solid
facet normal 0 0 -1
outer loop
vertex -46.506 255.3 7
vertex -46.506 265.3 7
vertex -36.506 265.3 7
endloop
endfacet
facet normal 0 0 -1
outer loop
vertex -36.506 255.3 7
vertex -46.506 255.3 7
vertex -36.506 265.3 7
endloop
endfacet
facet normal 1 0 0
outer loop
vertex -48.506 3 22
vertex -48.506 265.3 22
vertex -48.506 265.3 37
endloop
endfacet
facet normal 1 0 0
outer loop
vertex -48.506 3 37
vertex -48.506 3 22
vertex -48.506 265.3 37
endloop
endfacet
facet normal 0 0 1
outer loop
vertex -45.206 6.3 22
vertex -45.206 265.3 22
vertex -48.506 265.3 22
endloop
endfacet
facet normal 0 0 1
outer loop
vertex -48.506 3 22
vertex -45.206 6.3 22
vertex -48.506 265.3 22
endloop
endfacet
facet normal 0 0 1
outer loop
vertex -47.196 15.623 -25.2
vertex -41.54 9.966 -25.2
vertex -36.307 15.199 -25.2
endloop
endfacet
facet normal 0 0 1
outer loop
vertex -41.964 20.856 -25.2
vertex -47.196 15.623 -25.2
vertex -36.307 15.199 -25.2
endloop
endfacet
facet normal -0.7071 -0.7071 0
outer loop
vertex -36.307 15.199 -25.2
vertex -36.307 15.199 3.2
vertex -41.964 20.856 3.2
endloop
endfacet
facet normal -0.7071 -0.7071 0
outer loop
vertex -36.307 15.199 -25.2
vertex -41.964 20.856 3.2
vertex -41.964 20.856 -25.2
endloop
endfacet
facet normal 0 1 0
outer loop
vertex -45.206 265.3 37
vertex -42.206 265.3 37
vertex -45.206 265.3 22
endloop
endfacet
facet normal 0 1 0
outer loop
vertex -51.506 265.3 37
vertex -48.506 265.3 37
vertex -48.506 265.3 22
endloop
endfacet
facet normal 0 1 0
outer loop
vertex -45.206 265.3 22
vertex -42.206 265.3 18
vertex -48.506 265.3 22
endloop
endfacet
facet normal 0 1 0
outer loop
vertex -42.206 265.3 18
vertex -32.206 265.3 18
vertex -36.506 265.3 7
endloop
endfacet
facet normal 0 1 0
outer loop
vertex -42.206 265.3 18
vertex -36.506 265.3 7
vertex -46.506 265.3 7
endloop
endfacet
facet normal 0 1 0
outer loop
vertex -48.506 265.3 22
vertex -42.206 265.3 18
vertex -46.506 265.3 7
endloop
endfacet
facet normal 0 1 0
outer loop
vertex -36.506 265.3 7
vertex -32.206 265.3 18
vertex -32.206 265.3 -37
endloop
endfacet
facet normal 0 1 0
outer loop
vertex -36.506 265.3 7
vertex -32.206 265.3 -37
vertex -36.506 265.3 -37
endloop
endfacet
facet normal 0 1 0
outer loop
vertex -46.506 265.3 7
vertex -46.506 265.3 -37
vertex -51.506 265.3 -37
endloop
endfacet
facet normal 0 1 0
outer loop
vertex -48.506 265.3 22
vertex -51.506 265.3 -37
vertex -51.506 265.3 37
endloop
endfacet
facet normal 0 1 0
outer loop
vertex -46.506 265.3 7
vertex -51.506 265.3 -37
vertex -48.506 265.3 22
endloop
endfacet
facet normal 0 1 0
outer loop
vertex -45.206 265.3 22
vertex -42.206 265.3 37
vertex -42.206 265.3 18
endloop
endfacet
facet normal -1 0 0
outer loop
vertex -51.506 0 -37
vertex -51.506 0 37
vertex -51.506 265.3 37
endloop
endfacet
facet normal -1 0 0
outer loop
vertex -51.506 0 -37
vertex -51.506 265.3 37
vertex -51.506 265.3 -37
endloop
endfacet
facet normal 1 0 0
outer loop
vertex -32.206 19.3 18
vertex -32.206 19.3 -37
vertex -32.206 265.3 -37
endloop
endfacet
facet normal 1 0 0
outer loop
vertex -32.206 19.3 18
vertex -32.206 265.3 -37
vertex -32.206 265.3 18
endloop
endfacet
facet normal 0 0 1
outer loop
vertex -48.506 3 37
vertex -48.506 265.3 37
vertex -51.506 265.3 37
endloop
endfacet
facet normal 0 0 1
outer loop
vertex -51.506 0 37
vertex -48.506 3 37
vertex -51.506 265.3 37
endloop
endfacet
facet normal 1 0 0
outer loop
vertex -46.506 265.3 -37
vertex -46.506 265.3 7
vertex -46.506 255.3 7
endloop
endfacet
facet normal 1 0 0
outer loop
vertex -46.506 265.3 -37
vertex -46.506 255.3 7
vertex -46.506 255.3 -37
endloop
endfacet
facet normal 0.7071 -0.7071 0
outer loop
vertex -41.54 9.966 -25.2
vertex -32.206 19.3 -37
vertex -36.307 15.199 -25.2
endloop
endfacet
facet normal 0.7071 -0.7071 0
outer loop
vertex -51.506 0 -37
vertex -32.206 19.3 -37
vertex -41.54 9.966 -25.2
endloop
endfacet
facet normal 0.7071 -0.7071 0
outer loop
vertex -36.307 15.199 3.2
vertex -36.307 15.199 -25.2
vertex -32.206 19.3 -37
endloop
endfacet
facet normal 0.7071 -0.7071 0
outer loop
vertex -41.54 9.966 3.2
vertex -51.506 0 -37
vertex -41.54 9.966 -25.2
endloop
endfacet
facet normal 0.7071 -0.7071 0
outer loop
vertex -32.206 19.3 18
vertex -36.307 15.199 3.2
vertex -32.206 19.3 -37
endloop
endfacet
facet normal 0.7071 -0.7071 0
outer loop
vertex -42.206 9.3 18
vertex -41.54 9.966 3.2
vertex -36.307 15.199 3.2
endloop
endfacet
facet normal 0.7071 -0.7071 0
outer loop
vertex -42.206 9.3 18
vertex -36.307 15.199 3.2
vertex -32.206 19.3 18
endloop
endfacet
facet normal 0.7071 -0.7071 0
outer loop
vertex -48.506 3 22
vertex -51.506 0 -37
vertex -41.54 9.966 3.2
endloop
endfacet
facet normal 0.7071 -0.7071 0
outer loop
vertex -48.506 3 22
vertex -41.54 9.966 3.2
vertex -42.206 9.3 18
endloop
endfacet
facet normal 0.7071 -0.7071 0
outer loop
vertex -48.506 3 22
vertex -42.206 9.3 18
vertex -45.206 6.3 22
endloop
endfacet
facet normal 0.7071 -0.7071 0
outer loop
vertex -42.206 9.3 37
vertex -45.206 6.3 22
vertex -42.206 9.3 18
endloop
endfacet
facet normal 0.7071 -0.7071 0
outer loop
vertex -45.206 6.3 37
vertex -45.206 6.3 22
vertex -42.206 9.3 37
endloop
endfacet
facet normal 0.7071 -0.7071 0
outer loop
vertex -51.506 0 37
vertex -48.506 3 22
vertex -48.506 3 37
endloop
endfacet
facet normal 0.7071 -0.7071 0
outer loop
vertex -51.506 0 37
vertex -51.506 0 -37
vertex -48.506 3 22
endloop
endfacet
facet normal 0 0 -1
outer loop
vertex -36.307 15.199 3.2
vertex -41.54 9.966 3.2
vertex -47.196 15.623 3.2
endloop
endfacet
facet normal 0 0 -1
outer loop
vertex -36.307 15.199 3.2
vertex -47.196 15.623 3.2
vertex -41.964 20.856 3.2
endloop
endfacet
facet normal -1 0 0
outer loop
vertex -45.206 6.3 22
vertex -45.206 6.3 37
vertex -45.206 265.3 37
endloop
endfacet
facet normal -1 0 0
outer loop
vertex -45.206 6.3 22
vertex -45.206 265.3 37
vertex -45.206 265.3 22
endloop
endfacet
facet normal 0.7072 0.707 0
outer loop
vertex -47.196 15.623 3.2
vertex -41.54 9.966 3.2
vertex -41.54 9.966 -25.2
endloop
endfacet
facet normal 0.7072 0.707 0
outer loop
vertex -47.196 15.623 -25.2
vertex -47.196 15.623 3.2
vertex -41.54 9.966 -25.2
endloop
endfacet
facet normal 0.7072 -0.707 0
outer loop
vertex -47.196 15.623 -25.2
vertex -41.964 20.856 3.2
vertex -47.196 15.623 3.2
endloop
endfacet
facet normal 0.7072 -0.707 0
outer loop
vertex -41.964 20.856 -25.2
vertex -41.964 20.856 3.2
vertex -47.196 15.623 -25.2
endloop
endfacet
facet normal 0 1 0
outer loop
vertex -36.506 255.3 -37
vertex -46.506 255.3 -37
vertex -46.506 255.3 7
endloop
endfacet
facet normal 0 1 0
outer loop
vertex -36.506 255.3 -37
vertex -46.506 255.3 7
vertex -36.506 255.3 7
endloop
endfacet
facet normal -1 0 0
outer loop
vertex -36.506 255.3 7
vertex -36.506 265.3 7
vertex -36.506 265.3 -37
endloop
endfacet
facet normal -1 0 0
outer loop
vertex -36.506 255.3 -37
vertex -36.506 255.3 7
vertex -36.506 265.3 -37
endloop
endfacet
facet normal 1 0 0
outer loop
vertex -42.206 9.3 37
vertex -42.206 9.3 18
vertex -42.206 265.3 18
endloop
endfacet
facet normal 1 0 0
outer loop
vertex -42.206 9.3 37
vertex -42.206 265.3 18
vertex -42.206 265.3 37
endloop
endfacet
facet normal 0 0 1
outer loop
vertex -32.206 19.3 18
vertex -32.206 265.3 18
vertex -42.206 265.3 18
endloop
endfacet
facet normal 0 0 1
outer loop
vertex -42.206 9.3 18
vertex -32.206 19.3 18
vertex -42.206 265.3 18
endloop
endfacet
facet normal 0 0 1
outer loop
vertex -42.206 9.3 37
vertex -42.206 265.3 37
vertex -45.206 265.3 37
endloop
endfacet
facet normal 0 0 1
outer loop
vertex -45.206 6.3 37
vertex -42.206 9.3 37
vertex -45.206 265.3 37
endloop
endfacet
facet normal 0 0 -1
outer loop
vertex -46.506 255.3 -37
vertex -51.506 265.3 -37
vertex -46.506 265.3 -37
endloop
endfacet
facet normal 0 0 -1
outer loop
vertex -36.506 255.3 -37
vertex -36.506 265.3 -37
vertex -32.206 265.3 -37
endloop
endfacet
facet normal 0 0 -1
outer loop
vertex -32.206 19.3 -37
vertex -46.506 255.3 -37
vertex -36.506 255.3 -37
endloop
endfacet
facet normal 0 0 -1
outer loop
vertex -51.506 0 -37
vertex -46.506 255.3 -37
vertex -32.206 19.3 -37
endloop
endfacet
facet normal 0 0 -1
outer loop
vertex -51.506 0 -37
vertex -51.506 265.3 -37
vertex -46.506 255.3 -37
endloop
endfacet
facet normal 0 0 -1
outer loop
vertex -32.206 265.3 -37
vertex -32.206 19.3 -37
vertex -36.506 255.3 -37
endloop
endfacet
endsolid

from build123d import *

# Parameters (mm, degrees)
BOSS_EXTRUDE1_DEPTH = 265.3
SKETCH2_W           = 10
SKETCH2_H           = 44
CUT_EXTRUDE1_DEPTH  = 10
SKETCH3_W           = 271.149403365
SKETCH3_H           = 159.03985052
CUT_EXTRUDE2_DEPTH  = 31
SKETCH4_W           = 28
SKETCH4_H           = 7
CUT_EXTRUDE3_DEPTH  = 8
SKETCH5_W           = 28.4
SKETCH5_H           = 7.4
CUT_EXTRUDE4_DEPTH  = 8


with BuildPart() as part:
    # Sketch1 → Boss-Extrude1 (new body)
    with BuildSketch(Plane(origin=(0, 0, 0), x_dir=(1, 0, 0), z_dir=(0, 1, 0))):
        Polygon((-51.505795374, 37), (-32.205795374, 37), (-32.205795374, -18), (-42.205795374, -18), (-42.205795374, -37), (-45.205795374, -37), (-45.205795374, -22), (-48.505795374, -22), (-48.505795374, -37), (-51.505795374, -37), align=None)
    extrude(amount=BOSS_EXTRUDE1_DEPTH)

    # Sketch2 → Cut-Extrude1 (cut)
    with BuildSketch(Plane(origin=(0, 265.3, 0), x_dir=(1, 0, 0), z_dir=(0, 1, 0))):
        with Locations((-41.505795374, 15)):
            Rectangle(SKETCH2_W, SKETCH2_H)
    extrude(amount=-CUT_EXTRUDE1_DEPTH, mode=Mode.SUBTRACT)

    # Sketch3 → Cut-Extrude2 (cut)
    with BuildSketch(Plane(origin=(-25.752897687, 25.752897687, 0), x_dir=(0, 0, 1), z_dir=(0.7071067811865488, -0.7071067811865464, 0))):
        with Locations((3.075588753, 19.523863597)):
            Rectangle(SKETCH3_W, SKETCH3_H)
    extrude(amount=CUT_EXTRUDE2_DEPTH, mode=Mode.SUBTRACT)

    # Sketch4 → Cut-Extrude3 (cut)
    with BuildSketch(Plane(origin=(-25.752897687, 25.752897687, 0), x_dir=(0, 0, -1), z_dir=(0.7071067811865487, -0.7071067811865465, 0))):
        with Locations((11, -18.625775426)):
            Rectangle(SKETCH4_W, SKETCH4_H)
    extrude(amount=-CUT_EXTRUDE3_DEPTH, mode=Mode.SUBTRACT)

    # Sketch5 → Cut-Extrude4 (cut)
    with BuildSketch(Plane(origin=(-25.752897687, 25.752897687, 0), x_dir=(0, 0, -1), z_dir=(0.7071067811865487, -0.7071067811865465, 0))):
        with Locations((11, -18.625775426)):
            Rectangle(SKETCH5_W, SKETCH5_H)
    extrude(amount=-CUT_EXTRUDE4_DEPTH, mode=Mode.SUBTRACT)


solid = part.part
